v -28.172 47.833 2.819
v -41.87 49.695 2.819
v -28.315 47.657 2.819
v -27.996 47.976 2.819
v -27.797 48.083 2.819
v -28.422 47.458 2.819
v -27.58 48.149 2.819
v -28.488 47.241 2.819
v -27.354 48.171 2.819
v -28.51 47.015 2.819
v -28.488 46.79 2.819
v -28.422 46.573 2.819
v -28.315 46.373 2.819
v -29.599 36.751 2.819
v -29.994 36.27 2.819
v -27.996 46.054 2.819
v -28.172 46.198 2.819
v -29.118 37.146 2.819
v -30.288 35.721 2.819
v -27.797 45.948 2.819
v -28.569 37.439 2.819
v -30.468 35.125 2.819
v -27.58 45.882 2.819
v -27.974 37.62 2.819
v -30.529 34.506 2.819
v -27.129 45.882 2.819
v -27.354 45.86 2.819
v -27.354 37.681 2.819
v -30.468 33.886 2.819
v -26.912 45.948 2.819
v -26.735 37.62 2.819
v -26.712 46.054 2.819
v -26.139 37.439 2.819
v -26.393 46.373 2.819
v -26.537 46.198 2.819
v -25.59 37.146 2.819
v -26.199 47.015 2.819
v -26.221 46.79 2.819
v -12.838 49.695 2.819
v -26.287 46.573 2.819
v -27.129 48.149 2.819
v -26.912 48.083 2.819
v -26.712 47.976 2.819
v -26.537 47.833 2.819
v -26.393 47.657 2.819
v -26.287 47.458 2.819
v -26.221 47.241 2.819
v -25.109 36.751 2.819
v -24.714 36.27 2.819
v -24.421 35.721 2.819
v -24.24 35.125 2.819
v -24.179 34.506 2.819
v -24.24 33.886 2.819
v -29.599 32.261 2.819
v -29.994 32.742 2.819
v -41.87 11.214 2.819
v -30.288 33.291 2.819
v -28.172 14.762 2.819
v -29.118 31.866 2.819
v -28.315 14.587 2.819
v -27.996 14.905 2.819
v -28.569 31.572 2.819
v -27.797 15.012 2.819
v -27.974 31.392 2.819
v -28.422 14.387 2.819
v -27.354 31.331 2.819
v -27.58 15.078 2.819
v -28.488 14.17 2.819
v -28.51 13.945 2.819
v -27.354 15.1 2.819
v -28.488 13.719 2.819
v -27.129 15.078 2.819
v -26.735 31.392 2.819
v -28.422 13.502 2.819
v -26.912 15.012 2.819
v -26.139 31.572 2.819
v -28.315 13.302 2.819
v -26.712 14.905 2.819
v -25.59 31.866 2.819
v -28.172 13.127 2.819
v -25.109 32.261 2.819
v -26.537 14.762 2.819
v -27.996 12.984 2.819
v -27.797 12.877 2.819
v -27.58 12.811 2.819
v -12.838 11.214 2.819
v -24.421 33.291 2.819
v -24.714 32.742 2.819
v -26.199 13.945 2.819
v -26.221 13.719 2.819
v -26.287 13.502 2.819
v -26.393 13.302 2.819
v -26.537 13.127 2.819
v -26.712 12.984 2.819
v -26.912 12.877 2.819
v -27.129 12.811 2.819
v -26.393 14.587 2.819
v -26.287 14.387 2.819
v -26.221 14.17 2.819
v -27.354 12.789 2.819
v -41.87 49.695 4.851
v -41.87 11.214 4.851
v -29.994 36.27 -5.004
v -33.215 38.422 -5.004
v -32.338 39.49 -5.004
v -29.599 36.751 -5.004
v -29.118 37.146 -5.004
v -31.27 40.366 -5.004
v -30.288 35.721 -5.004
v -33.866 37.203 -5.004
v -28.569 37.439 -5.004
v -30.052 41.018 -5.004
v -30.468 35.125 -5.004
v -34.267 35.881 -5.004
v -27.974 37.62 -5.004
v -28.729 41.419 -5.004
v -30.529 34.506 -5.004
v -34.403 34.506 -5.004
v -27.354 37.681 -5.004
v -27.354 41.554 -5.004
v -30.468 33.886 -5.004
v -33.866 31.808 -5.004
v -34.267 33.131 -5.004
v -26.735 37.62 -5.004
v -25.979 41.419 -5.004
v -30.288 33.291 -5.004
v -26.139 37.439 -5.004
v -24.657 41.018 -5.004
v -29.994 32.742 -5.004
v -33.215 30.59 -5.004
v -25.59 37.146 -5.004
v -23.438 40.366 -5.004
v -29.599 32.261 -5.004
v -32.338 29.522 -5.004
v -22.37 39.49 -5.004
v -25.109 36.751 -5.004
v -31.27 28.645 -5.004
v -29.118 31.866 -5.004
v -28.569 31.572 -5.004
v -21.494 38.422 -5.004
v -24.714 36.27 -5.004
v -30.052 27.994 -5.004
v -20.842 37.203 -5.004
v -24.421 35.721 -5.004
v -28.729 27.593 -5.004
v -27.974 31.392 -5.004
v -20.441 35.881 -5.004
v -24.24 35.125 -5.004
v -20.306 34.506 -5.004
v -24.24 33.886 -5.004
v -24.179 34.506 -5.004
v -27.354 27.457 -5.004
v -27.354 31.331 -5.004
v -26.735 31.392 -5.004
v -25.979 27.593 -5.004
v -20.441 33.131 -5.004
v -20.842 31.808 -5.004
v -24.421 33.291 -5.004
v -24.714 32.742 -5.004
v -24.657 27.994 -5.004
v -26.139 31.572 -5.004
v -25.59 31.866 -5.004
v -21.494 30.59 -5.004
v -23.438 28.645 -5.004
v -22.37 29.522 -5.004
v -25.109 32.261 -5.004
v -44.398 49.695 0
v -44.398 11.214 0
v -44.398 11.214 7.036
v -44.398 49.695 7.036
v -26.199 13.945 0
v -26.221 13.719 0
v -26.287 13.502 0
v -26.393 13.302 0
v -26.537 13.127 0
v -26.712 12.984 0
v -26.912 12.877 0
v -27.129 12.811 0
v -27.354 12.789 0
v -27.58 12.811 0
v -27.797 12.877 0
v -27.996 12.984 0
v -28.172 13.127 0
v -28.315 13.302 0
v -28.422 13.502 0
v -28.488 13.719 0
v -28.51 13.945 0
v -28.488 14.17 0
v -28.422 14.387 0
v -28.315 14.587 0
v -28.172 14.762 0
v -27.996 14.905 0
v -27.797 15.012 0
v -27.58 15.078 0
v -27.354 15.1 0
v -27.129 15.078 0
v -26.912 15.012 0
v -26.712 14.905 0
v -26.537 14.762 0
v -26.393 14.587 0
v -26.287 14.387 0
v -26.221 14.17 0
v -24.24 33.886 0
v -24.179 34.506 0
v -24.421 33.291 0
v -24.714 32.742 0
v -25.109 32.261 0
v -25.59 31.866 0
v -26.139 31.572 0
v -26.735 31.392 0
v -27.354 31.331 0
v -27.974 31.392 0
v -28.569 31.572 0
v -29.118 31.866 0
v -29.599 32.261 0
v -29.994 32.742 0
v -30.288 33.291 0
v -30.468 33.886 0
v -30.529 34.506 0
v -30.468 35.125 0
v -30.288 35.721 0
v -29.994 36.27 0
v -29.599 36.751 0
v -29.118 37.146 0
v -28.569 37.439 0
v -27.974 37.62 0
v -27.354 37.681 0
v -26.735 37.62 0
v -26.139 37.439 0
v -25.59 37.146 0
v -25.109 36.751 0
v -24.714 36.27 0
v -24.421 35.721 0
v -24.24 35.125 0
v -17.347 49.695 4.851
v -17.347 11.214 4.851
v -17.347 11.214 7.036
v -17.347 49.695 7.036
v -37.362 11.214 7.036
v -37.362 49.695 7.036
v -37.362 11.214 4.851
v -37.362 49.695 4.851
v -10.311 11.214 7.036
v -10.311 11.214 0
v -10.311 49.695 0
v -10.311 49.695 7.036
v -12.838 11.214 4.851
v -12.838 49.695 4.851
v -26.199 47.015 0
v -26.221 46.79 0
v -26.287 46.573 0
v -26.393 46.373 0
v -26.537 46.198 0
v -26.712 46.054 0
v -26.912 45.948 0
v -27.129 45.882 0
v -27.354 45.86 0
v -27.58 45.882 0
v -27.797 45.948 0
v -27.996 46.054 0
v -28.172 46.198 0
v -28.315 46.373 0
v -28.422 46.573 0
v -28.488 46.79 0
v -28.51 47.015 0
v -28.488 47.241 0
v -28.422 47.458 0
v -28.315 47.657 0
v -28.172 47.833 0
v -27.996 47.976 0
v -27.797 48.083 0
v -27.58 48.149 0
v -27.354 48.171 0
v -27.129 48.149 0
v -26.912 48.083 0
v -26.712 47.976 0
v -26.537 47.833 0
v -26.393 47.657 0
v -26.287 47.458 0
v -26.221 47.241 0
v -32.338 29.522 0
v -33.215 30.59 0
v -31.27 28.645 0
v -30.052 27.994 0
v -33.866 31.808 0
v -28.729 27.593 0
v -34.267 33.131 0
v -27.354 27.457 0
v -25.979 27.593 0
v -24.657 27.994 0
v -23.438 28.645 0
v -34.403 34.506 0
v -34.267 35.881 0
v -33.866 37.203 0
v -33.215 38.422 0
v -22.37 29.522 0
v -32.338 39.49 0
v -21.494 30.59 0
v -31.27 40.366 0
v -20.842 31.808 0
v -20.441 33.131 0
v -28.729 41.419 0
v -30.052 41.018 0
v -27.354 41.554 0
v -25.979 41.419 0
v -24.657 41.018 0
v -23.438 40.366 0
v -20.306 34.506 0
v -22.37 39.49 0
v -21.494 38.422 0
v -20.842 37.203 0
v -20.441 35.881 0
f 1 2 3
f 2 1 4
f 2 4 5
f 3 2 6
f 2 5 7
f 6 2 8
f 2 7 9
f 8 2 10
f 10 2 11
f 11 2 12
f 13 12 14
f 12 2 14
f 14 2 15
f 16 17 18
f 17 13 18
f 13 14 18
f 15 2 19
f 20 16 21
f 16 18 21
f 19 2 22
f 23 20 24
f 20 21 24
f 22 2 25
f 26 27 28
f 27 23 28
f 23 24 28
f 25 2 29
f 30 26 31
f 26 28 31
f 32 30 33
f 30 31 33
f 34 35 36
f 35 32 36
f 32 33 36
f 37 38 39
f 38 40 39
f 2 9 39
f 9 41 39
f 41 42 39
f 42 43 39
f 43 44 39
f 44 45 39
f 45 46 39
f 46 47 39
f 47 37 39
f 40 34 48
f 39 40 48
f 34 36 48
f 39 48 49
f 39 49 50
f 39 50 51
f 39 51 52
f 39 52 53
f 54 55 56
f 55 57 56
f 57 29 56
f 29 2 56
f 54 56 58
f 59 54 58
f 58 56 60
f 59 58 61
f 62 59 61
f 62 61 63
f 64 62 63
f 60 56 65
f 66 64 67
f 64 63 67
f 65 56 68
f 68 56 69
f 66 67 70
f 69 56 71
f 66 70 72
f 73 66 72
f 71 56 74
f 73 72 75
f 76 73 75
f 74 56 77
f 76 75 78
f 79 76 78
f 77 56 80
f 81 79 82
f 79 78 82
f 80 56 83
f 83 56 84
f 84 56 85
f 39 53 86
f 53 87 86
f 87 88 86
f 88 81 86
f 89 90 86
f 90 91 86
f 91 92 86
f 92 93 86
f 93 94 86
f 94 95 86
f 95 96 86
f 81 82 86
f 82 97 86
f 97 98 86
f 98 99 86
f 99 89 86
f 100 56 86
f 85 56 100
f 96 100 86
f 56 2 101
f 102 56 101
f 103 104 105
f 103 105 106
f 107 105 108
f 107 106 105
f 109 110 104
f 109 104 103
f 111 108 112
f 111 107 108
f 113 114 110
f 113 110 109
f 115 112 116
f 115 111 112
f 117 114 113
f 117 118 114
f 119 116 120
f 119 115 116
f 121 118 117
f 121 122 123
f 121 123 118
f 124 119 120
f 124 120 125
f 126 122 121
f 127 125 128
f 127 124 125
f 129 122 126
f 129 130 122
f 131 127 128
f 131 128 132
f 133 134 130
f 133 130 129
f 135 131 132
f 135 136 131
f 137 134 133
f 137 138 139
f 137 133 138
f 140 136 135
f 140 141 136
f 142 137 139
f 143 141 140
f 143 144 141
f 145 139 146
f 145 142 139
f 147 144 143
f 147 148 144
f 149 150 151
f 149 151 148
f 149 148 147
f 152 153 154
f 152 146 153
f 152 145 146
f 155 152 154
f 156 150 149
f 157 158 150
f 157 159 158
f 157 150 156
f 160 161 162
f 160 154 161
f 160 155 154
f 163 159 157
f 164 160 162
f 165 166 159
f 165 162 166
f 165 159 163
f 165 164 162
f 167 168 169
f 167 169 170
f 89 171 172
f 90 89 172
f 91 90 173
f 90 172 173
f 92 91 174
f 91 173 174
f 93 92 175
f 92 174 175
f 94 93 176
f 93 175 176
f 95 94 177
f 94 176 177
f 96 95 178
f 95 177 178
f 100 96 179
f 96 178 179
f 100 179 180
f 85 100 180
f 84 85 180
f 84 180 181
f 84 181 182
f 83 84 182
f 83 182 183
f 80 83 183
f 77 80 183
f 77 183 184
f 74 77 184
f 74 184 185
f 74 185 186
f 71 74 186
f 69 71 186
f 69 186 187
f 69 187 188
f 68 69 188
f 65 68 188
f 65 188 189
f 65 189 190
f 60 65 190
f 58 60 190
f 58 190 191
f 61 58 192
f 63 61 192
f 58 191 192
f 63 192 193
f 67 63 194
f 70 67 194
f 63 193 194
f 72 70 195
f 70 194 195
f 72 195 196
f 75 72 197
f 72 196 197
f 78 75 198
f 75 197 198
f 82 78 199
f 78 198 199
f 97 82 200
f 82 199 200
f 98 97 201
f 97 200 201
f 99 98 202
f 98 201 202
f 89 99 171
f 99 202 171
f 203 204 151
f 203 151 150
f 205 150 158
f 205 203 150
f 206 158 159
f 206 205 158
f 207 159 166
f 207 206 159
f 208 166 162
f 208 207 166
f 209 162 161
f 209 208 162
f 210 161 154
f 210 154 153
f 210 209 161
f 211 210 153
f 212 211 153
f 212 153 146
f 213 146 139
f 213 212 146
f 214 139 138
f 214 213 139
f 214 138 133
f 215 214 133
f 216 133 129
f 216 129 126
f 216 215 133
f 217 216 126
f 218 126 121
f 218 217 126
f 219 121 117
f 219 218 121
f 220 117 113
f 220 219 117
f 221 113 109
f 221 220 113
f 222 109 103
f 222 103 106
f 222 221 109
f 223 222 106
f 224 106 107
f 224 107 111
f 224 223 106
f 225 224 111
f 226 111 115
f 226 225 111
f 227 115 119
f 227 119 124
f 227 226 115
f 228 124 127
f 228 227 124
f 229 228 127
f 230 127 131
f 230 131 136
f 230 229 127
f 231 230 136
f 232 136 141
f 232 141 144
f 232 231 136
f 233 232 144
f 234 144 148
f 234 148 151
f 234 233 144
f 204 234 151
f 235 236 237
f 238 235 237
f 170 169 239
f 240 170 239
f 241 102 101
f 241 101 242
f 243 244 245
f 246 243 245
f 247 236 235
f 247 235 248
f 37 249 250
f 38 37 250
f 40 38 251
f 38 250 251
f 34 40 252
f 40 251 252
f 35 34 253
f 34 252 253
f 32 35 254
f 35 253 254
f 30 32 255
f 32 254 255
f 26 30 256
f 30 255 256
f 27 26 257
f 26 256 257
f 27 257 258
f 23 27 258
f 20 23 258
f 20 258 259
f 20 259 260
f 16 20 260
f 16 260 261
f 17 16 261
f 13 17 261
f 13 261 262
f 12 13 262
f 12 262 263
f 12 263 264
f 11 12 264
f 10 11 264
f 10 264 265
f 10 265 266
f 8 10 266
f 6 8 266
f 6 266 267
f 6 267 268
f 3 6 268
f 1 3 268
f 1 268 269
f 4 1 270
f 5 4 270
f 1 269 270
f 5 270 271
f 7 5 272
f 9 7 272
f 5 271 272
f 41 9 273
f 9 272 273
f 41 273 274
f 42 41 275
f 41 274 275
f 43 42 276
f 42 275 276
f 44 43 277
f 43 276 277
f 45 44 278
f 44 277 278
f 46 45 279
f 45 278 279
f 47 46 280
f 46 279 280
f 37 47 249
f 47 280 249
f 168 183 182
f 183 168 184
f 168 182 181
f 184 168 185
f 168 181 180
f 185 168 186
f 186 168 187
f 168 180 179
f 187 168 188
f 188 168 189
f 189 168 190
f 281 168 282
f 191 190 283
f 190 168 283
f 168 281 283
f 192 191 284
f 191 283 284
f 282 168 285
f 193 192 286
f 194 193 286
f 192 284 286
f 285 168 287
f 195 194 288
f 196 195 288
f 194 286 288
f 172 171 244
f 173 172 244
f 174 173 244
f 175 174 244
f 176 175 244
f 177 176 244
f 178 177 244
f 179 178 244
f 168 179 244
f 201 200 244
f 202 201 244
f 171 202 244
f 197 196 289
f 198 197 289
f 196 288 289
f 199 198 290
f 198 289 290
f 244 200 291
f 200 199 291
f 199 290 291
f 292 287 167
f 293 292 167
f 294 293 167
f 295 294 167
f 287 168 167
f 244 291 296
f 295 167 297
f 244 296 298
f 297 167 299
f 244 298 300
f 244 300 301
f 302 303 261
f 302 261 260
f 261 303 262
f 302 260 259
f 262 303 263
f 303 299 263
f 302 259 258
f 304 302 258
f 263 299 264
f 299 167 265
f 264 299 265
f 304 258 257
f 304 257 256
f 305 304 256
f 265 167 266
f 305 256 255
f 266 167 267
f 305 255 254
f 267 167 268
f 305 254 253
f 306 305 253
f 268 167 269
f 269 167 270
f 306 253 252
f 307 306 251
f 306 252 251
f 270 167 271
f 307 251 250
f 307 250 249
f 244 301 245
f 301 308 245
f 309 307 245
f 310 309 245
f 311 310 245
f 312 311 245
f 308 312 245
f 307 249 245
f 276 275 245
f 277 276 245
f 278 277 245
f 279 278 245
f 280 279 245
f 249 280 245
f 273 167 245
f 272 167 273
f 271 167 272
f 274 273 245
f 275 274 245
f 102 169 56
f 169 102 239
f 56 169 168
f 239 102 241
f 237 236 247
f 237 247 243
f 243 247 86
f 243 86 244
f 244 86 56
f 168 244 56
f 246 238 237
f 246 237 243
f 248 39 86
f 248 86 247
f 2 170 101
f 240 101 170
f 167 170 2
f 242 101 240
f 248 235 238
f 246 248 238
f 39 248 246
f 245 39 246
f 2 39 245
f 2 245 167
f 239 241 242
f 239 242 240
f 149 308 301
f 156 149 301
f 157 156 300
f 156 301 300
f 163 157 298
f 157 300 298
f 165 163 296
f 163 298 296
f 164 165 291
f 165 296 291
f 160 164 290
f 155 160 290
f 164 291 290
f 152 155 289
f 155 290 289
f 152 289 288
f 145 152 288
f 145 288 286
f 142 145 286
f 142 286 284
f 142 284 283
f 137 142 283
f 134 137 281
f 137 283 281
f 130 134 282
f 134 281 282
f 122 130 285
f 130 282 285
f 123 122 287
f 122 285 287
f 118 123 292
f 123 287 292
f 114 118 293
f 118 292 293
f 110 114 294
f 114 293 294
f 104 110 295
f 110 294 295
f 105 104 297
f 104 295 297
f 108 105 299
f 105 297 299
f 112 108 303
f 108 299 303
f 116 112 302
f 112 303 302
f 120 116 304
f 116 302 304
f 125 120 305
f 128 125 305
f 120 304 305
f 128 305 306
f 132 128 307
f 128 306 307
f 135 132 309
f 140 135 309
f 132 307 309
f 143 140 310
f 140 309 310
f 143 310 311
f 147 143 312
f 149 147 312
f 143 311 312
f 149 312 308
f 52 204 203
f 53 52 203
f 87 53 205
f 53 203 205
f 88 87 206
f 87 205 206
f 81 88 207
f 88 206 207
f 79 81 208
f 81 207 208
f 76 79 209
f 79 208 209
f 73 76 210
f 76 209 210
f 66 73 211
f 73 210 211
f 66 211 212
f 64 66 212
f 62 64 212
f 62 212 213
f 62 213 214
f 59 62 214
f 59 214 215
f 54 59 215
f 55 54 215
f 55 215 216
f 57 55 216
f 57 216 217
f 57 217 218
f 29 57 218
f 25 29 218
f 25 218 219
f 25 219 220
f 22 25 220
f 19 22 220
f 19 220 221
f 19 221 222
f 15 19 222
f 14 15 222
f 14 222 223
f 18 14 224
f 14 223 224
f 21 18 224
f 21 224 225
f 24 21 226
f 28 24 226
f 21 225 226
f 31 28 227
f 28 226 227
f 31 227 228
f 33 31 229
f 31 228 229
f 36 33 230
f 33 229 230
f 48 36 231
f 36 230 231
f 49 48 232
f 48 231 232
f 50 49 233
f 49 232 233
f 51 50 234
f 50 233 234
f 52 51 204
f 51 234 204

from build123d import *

# Parameters (mm, degrees)
F0_W     = 34.0868
F0_H     = 38.481
F1_DEPTH = 7.0358
F2_W     = 20.0152
F2_H     = 2.1844
F3_DEPTH = 38.482
F4_W     = 29.0322
F4_H     = 2.032
F5_DEPTH = 38.482
F6_R     = 1.1557
F6_R_2   = 3.175
F7_DEPTH = 25.4
F8_R     = 7.0485
F8_R_2   = 3.175
F9_DEPTH = 5.0038


with BuildPart() as f1:
    # F0 (on Top) → F1 (new body)
    with BuildSketch(Plane.XY):
        with Locations((-27.354376, 30.454514)):
            Rectangle(F0_W, F0_H)
    extrude(amount=F1_DEPTH)

    # F2 (on face) → F3 (cut, through all)
    with BuildSketch(Plane.XZ.offset(-11.214014)):
        with Locations((-27.354376, 5.9436)):
            Rectangle(F2_W, F2_H)
    extrude(amount=-F3_DEPTH, mode=Mode.SUBTRACT)

    # F4 (on face) → F5 (cut, through all)
    with BuildSketch(Plane.XZ.offset(-11.214014)):
        with Locations((-27.354376, 3.8354)):
            Rectangle(F4_W, F4_H)
    extrude(amount=-F5_DEPTH, mode=Mode.SUBTRACT)

    # F6 (on face) → F7 (cut)
    with BuildSketch(Plane(origin=(0, 0, 0), x_dir=(1, 0, 0), z_dir=(0, 0, -1))):
        with Locations((-27.354376, -13.944514)):
            Circle(F6_R)
        with Locations((-27.354376, -34.505814)):
            Circle(F6_R_2)
        with Locations((-27.354376, -47.015314)):
            Circle(F6_R)
    extrude(amount=-F7_DEPTH, mode=Mode.SUBTRACT)

    # F8 (on face) → F9 (join)
    with BuildSketch(Plane(origin=(0, 0, 0), x_dir=(1, 0, 0), z_dir=(0, 0, -1))):
        with Locations((-27.354376, -34.505814)):
            Circle(F8_R)
        with Locations((-27.354376, -34.505814)):
            Circle(F8_R_2, mode=Mode.SUBTRACT)
    extrude(amount=F9_DEPTH)


solid = f1.part
